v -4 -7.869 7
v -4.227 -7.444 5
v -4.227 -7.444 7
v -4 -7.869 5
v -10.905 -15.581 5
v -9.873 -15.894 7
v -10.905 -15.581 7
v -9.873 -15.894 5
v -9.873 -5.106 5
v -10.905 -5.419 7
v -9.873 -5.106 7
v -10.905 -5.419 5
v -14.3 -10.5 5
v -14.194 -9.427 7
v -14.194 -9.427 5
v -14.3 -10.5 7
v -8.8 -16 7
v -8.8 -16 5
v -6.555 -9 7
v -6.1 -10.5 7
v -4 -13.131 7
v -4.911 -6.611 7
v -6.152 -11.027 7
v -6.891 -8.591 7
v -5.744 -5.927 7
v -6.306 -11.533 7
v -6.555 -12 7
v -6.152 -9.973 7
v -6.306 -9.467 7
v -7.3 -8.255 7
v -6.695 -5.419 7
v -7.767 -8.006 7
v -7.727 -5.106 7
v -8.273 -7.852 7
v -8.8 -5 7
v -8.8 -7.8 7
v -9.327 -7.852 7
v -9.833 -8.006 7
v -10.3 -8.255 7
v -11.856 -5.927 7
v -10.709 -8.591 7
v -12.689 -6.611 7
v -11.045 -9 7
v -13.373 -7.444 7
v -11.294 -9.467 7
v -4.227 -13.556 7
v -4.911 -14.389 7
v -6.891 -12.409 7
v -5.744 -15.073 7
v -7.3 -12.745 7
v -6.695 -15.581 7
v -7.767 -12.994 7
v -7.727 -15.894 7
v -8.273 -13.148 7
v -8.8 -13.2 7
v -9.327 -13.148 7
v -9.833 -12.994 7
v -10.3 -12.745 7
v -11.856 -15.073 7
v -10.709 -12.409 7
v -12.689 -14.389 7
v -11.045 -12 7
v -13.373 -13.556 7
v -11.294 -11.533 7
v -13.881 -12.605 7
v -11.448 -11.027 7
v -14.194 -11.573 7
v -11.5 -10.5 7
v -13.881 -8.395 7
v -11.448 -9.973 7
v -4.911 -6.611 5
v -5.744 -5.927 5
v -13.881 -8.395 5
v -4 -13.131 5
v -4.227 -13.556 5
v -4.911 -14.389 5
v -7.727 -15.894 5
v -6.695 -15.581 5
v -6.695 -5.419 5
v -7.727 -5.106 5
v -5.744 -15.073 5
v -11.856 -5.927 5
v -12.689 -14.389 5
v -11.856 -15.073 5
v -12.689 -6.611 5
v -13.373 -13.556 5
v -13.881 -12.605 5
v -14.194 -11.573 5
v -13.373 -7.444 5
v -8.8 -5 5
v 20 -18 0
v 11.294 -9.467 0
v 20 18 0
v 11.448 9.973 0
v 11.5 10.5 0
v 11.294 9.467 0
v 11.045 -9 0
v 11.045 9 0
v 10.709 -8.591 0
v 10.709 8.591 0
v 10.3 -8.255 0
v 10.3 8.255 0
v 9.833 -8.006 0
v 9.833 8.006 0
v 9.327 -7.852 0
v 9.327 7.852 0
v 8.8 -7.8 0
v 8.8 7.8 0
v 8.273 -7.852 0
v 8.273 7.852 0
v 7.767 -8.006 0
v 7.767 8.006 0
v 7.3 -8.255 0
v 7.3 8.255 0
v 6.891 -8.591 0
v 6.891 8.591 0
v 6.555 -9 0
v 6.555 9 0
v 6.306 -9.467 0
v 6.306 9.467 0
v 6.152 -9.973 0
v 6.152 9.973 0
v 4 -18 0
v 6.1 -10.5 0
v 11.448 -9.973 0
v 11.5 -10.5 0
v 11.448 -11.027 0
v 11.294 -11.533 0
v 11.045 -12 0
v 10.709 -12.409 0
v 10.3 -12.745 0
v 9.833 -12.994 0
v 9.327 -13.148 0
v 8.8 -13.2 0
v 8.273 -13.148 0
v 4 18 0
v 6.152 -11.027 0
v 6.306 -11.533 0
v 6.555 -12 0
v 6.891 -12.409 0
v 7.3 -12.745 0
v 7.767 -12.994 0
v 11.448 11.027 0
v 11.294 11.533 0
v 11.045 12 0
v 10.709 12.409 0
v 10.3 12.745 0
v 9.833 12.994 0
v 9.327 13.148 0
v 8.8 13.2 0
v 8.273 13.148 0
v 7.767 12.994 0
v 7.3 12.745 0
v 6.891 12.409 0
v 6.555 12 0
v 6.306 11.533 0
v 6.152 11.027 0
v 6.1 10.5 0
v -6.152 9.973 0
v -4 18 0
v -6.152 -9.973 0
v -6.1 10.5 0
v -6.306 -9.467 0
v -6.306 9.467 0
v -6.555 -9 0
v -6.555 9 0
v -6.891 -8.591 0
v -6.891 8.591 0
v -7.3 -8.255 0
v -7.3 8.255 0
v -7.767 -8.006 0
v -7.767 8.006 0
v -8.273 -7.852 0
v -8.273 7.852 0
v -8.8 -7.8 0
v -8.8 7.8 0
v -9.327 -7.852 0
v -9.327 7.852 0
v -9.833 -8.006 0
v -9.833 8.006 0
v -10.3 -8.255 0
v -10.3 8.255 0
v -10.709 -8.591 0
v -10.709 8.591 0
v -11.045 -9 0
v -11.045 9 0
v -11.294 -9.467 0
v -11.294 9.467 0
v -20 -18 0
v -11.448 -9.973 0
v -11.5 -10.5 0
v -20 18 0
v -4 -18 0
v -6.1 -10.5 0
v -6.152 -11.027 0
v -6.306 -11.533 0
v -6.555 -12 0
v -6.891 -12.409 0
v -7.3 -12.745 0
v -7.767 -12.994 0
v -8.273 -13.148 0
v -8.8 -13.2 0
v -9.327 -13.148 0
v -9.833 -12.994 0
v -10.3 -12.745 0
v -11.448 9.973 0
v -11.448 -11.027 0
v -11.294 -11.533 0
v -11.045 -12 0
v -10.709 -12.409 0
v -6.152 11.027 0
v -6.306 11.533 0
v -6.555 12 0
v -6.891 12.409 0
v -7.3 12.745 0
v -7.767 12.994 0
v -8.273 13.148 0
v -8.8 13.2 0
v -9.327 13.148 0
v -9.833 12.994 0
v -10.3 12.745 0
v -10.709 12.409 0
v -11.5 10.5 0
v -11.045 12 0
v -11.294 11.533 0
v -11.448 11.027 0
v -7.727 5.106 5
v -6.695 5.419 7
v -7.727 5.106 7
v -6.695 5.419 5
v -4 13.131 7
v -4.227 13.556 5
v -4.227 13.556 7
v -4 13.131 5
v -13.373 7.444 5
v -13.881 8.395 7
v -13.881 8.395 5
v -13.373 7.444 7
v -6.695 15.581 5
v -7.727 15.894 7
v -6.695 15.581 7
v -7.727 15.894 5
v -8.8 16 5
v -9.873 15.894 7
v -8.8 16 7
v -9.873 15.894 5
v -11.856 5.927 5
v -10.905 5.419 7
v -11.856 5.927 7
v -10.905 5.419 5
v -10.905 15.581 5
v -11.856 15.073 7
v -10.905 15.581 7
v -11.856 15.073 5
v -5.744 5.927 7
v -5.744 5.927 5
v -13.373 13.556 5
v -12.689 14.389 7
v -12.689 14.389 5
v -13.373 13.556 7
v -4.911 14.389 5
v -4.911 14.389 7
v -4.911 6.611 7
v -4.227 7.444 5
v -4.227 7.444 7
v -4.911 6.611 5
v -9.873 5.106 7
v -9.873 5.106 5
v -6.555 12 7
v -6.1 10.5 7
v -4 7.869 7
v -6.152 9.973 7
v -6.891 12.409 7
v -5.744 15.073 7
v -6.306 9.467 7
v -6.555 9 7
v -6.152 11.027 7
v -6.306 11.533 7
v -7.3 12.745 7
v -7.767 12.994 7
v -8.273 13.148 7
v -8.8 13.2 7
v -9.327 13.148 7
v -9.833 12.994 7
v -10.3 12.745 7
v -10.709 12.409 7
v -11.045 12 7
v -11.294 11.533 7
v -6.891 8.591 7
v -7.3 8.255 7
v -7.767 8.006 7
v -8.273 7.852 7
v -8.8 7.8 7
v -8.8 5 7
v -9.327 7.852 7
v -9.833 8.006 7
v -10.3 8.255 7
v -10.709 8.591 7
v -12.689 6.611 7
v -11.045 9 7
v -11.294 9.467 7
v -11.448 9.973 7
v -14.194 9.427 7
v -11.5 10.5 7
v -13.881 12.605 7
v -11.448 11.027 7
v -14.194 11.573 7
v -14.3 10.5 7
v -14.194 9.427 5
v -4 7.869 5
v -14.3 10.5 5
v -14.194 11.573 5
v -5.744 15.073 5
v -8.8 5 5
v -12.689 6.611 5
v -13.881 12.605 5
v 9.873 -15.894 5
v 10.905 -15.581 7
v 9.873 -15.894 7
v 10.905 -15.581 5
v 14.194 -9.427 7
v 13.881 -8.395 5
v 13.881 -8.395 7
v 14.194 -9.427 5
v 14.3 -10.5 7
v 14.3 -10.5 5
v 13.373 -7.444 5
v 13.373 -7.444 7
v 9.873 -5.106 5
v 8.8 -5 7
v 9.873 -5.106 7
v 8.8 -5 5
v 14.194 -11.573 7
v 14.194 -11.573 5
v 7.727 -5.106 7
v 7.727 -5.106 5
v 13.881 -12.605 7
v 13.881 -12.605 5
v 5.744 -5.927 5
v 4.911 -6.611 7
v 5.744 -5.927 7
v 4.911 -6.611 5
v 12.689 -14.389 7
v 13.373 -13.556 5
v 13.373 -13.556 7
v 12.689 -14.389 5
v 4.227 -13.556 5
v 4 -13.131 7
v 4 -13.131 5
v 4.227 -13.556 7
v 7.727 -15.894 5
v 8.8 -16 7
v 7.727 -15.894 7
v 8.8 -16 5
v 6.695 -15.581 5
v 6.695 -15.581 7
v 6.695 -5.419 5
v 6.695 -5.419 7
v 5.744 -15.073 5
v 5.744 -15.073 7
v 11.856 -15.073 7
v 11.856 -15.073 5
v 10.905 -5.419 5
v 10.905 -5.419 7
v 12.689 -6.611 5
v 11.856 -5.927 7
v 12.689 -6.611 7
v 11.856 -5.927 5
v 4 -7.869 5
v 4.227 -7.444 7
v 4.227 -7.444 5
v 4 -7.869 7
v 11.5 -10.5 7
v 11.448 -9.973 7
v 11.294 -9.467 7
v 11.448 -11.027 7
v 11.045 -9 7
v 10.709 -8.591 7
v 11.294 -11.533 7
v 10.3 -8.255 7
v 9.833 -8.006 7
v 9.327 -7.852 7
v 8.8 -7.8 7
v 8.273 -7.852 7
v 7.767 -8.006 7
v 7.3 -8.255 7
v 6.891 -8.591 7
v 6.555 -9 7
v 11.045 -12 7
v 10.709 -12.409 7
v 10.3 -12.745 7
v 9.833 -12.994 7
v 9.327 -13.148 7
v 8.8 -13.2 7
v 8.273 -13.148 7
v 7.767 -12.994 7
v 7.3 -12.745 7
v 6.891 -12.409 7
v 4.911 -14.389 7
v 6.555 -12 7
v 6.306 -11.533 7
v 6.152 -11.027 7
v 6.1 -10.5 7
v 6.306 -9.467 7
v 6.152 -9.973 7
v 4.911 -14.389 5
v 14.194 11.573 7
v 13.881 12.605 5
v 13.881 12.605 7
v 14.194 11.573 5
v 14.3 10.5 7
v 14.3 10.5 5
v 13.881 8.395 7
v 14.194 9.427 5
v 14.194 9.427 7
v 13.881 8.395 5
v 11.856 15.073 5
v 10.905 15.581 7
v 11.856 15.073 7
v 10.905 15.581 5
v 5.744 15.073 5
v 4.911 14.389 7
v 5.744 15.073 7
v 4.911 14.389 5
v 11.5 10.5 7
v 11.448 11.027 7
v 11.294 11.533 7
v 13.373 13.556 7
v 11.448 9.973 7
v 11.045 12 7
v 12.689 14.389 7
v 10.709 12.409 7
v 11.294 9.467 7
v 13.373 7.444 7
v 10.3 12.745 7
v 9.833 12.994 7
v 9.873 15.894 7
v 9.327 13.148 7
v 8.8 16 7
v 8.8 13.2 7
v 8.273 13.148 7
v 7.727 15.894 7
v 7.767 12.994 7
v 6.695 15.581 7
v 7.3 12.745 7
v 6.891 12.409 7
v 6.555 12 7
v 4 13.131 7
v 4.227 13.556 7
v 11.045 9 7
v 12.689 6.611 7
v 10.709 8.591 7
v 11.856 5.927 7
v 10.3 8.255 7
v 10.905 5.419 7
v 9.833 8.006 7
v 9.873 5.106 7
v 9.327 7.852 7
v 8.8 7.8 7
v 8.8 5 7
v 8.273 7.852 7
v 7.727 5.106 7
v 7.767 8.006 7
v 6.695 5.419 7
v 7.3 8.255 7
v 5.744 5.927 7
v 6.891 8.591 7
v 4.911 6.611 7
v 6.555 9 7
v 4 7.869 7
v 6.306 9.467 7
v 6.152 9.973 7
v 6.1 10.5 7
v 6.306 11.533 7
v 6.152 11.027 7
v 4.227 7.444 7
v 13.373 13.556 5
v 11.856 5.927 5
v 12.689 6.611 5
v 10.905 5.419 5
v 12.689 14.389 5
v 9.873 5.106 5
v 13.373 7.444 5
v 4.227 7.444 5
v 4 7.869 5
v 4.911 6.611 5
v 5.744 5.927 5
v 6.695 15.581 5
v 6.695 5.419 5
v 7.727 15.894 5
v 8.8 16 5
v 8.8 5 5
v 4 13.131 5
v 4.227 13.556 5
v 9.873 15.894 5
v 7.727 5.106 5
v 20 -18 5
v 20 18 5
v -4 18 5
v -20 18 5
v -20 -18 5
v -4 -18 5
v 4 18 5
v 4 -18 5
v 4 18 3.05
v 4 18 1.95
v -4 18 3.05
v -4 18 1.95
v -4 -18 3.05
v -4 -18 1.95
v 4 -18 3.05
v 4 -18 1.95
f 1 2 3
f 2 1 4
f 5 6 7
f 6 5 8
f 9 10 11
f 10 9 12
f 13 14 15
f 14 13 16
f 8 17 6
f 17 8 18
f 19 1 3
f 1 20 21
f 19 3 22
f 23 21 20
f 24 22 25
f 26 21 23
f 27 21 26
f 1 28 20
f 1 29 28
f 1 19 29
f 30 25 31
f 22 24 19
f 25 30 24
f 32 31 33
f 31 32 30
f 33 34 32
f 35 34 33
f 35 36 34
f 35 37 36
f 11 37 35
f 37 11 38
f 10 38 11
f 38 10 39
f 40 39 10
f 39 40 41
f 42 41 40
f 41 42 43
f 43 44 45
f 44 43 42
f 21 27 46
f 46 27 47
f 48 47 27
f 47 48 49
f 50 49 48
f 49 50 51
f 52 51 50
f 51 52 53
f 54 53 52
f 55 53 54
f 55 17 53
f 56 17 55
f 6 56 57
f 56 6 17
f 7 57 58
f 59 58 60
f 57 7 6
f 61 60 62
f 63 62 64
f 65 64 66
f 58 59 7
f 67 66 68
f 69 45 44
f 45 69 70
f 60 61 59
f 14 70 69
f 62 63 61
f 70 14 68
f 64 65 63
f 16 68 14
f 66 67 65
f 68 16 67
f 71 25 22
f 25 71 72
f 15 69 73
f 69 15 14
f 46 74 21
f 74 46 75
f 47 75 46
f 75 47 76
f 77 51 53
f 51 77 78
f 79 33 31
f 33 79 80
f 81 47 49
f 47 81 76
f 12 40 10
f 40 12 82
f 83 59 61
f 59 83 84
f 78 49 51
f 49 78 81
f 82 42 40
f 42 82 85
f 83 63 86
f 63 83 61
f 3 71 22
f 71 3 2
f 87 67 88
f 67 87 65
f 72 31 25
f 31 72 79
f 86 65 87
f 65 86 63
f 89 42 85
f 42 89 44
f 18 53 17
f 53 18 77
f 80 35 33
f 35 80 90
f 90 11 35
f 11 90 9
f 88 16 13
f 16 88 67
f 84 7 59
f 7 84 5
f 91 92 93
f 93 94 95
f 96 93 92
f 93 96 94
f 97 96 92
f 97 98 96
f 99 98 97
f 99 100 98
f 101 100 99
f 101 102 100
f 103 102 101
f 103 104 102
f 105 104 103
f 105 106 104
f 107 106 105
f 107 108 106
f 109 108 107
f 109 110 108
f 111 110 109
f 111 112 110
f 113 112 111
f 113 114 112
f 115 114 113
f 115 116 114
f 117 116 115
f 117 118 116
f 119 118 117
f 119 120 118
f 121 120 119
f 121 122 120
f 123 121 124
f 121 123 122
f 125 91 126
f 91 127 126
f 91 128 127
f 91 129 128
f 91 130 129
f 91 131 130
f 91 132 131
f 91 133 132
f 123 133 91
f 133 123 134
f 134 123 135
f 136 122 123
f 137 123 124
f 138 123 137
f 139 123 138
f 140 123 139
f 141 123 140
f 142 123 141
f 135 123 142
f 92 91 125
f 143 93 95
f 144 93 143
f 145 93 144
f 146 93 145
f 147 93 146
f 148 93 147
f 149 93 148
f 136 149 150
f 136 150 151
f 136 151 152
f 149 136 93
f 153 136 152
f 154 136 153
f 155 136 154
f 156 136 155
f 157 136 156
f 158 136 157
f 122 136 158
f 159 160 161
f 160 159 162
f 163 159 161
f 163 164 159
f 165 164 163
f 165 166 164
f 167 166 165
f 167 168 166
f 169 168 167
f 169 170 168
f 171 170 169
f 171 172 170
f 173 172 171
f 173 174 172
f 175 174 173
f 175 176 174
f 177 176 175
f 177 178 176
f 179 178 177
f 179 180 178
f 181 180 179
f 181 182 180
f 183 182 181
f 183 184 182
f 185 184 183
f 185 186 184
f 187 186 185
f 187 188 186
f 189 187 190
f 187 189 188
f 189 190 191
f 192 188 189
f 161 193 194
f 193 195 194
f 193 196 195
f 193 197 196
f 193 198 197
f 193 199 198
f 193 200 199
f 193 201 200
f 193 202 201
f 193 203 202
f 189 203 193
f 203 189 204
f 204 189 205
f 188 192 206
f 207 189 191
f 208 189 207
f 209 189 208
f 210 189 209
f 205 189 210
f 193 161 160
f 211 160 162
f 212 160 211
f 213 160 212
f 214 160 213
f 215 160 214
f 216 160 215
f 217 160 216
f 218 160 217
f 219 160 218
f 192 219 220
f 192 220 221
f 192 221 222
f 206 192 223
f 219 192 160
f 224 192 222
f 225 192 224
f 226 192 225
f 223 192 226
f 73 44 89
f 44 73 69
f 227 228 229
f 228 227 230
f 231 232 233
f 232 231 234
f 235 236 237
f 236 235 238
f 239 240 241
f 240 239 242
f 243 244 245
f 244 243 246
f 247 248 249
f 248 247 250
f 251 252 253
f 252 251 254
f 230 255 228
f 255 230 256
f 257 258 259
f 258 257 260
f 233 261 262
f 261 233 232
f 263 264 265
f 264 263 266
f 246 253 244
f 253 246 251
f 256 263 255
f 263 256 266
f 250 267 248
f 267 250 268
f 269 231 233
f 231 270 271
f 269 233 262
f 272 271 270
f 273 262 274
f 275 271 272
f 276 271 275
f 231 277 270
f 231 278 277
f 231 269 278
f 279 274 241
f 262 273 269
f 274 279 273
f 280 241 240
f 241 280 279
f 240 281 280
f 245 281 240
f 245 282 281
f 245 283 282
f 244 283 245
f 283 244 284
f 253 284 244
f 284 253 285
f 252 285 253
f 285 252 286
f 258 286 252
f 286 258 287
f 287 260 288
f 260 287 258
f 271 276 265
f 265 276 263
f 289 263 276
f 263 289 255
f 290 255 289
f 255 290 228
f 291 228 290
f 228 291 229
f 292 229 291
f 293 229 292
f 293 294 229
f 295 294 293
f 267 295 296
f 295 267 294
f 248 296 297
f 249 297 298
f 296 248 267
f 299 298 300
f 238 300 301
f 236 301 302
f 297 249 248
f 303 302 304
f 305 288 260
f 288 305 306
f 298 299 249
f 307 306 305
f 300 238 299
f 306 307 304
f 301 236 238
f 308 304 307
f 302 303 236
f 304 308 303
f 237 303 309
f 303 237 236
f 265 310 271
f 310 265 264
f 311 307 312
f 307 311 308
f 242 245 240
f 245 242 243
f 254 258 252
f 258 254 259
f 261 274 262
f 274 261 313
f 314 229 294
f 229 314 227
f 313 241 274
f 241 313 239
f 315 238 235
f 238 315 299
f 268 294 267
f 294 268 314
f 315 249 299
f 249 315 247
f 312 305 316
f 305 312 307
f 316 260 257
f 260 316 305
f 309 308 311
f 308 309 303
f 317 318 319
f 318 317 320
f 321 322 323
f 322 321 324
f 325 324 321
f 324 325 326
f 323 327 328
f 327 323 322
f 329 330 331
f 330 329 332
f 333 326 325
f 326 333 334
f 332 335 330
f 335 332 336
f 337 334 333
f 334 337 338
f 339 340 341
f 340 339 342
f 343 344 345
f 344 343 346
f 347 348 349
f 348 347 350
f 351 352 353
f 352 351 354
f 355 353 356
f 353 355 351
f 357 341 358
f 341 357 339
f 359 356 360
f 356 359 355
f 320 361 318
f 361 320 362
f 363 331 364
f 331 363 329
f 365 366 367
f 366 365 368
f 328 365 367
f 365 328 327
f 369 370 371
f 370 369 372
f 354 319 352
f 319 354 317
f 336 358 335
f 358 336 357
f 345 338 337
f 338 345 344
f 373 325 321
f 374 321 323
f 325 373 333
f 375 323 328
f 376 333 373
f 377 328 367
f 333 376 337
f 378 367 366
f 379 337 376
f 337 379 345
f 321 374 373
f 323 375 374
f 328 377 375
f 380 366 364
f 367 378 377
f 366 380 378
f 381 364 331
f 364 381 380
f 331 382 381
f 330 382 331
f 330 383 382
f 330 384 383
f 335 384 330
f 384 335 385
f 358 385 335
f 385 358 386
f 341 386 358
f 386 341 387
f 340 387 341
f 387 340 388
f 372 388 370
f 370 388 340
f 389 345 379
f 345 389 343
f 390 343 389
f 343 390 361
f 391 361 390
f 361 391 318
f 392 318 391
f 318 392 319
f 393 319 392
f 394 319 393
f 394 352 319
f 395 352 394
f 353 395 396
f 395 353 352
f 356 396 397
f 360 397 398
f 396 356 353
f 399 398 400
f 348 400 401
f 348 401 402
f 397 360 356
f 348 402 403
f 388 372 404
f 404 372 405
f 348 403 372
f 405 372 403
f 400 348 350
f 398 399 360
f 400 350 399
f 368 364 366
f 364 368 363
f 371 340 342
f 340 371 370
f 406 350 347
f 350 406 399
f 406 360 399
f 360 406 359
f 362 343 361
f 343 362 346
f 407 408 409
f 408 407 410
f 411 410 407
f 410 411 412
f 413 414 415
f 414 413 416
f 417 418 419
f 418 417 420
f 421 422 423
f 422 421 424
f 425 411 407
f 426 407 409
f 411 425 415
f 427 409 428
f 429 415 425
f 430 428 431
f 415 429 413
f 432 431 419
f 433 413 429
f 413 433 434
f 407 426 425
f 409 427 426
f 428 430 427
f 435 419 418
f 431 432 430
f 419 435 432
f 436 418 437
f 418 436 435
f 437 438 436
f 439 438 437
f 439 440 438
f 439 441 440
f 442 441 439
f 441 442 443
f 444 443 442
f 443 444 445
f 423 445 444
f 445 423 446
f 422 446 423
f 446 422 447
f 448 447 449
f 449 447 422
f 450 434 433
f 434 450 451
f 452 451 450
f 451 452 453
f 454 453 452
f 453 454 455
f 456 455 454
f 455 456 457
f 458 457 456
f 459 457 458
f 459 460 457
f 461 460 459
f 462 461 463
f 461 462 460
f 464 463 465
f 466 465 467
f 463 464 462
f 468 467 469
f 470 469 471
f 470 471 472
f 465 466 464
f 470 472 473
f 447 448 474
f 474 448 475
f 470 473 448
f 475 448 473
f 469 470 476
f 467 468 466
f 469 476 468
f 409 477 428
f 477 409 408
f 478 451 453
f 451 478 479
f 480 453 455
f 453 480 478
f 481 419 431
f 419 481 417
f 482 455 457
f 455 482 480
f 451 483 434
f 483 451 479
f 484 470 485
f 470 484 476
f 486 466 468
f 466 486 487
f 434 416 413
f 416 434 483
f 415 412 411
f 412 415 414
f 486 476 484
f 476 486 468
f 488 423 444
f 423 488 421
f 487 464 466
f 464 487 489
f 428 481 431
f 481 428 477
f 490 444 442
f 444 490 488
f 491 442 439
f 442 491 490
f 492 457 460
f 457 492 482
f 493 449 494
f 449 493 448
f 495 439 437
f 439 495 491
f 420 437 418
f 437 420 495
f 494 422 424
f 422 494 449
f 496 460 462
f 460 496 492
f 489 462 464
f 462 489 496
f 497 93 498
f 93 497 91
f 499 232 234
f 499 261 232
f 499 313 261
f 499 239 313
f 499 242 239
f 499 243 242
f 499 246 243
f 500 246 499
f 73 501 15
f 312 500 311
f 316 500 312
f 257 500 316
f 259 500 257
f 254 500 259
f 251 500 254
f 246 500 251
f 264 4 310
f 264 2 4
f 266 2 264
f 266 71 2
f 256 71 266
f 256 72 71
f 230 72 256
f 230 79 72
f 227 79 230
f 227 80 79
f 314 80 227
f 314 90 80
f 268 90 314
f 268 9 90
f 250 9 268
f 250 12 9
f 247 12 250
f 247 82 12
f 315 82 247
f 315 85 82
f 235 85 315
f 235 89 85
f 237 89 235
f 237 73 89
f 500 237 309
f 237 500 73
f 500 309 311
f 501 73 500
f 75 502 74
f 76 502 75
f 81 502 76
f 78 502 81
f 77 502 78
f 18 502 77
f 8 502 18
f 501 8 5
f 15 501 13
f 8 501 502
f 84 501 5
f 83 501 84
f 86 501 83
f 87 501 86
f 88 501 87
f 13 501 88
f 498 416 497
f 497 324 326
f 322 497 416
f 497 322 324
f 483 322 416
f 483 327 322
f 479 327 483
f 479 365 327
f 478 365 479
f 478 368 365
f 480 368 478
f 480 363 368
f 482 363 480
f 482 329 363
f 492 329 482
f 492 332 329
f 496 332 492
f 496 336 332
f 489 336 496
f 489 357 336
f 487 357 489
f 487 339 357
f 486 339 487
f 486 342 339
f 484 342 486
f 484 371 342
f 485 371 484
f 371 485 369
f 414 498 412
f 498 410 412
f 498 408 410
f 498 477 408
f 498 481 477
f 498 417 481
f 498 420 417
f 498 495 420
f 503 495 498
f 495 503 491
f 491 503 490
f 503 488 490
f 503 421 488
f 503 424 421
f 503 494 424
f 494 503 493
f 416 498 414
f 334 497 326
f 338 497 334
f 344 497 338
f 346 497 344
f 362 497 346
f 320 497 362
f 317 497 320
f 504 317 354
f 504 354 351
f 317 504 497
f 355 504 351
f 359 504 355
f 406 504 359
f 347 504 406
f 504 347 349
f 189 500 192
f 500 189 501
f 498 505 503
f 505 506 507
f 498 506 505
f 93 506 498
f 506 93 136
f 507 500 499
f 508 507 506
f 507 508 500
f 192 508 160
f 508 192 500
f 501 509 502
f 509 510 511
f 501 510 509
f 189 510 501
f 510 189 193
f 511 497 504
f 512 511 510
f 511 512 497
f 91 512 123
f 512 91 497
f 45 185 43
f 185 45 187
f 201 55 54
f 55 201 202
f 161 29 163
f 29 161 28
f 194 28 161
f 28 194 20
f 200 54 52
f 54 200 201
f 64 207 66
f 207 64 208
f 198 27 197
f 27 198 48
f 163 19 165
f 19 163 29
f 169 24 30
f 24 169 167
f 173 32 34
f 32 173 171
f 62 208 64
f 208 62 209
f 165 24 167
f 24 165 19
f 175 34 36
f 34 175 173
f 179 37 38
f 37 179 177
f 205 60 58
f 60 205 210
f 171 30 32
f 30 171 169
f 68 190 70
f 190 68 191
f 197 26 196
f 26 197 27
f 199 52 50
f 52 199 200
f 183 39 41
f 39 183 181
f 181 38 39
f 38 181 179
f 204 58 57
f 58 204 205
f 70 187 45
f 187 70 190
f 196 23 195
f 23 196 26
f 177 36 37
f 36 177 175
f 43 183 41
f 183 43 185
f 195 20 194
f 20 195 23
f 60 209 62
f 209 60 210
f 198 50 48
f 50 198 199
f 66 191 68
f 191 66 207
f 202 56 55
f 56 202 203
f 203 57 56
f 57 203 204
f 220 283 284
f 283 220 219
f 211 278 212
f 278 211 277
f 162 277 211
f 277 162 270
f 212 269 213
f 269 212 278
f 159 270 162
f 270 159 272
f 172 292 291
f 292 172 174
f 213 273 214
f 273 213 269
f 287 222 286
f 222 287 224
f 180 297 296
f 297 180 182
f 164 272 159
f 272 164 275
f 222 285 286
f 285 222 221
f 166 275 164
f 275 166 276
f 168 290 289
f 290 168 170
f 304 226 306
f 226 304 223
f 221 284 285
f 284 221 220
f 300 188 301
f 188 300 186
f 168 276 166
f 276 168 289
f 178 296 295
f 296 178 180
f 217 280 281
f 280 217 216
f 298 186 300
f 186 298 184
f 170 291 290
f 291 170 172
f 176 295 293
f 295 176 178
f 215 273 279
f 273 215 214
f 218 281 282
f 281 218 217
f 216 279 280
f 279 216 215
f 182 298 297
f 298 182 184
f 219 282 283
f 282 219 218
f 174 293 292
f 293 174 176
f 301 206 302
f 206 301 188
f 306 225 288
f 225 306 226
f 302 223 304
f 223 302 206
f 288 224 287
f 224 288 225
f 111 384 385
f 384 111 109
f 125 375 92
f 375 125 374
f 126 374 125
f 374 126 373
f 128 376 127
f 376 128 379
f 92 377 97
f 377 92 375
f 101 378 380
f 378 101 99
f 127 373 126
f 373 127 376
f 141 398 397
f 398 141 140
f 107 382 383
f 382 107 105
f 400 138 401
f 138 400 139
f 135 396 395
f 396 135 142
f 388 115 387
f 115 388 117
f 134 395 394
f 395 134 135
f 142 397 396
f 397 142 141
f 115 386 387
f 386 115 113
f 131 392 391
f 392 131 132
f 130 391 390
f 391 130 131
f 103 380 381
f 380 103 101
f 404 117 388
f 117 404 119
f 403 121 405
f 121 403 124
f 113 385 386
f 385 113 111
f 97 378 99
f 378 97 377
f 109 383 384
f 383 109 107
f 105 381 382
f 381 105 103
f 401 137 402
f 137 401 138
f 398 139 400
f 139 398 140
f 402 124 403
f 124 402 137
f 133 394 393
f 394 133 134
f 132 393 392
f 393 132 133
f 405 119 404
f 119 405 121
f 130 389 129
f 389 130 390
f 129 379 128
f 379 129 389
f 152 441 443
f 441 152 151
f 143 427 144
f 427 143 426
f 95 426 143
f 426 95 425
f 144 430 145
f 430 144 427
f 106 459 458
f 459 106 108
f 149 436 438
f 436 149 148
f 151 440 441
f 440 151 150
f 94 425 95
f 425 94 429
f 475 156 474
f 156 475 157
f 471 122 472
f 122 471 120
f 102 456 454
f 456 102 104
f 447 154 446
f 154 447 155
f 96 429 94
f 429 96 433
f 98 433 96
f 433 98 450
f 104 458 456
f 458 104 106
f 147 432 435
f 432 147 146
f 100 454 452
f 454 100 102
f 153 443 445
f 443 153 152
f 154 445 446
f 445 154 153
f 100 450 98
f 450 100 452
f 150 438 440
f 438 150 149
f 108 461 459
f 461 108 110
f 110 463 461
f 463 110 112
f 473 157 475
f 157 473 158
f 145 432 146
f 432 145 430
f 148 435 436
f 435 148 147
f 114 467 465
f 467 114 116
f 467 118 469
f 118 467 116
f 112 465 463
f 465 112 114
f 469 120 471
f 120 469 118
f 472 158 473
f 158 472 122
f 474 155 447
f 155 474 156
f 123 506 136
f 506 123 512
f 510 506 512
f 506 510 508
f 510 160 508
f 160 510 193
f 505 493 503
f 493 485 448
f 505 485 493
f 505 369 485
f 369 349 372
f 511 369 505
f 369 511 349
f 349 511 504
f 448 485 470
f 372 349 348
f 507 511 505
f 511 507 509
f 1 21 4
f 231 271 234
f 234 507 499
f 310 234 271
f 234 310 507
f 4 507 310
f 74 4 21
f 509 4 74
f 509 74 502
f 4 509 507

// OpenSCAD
$fn = 32;

// ----------------------------------------------------------------------
// Living hinge: 40 x 36 mm plates, 1.1 mm flexible web
// ----------------------------------------------------------------------

// --- parameters (mm) ---
plate_len = 16;           // plate length outside the web
plate_w = 36;             // plate width
thick = 5;                // plate thickness
web_half = 4;             // half width of the flex band
web_t = 1.1;              // flexible web thickness
web_z = 1.95;             // web position inside the thickness
boss_d = 11;              // screw boss diameter
boss_h = 7;               // screw boss height
boss_x = 8.8;             // screw boss distance from the web
screw_d = 5.4;            // screw hole

difference() {
  union() {
    /* one flat strip, later thinned at the middle */
    translate([-20, -18, 0]) cube([40, 36, 5]);
    /* screw bosses, sunk 0.5 mm into the plates */
    for (sx = [-8.8, 8.8]) {
      for (sy = [-10.5, 10.5]) {
        translate([sx, sy, 0]) cylinder(h = boss_h, d = boss_d);
      }
    }
  }
  /* channel from below: leaves the web on top of it */
  translate([-4, -20.5, -2.5]) cube([8, 41, 4.45]);
  /* channel from above: thins the web down to web_t */
  translate([-4, -20.5, 3.05]) cube([8, 41, 4.45]);
  /* screw holes through the bosses */
  for (sx = [-8.8, 8.8]) {
    for (sy = [-10.5, 10.5]) {
      translate([sx, sy, -2.5]) cylinder(h = boss_h + 5, d = screw_d);
    }
  }
}
